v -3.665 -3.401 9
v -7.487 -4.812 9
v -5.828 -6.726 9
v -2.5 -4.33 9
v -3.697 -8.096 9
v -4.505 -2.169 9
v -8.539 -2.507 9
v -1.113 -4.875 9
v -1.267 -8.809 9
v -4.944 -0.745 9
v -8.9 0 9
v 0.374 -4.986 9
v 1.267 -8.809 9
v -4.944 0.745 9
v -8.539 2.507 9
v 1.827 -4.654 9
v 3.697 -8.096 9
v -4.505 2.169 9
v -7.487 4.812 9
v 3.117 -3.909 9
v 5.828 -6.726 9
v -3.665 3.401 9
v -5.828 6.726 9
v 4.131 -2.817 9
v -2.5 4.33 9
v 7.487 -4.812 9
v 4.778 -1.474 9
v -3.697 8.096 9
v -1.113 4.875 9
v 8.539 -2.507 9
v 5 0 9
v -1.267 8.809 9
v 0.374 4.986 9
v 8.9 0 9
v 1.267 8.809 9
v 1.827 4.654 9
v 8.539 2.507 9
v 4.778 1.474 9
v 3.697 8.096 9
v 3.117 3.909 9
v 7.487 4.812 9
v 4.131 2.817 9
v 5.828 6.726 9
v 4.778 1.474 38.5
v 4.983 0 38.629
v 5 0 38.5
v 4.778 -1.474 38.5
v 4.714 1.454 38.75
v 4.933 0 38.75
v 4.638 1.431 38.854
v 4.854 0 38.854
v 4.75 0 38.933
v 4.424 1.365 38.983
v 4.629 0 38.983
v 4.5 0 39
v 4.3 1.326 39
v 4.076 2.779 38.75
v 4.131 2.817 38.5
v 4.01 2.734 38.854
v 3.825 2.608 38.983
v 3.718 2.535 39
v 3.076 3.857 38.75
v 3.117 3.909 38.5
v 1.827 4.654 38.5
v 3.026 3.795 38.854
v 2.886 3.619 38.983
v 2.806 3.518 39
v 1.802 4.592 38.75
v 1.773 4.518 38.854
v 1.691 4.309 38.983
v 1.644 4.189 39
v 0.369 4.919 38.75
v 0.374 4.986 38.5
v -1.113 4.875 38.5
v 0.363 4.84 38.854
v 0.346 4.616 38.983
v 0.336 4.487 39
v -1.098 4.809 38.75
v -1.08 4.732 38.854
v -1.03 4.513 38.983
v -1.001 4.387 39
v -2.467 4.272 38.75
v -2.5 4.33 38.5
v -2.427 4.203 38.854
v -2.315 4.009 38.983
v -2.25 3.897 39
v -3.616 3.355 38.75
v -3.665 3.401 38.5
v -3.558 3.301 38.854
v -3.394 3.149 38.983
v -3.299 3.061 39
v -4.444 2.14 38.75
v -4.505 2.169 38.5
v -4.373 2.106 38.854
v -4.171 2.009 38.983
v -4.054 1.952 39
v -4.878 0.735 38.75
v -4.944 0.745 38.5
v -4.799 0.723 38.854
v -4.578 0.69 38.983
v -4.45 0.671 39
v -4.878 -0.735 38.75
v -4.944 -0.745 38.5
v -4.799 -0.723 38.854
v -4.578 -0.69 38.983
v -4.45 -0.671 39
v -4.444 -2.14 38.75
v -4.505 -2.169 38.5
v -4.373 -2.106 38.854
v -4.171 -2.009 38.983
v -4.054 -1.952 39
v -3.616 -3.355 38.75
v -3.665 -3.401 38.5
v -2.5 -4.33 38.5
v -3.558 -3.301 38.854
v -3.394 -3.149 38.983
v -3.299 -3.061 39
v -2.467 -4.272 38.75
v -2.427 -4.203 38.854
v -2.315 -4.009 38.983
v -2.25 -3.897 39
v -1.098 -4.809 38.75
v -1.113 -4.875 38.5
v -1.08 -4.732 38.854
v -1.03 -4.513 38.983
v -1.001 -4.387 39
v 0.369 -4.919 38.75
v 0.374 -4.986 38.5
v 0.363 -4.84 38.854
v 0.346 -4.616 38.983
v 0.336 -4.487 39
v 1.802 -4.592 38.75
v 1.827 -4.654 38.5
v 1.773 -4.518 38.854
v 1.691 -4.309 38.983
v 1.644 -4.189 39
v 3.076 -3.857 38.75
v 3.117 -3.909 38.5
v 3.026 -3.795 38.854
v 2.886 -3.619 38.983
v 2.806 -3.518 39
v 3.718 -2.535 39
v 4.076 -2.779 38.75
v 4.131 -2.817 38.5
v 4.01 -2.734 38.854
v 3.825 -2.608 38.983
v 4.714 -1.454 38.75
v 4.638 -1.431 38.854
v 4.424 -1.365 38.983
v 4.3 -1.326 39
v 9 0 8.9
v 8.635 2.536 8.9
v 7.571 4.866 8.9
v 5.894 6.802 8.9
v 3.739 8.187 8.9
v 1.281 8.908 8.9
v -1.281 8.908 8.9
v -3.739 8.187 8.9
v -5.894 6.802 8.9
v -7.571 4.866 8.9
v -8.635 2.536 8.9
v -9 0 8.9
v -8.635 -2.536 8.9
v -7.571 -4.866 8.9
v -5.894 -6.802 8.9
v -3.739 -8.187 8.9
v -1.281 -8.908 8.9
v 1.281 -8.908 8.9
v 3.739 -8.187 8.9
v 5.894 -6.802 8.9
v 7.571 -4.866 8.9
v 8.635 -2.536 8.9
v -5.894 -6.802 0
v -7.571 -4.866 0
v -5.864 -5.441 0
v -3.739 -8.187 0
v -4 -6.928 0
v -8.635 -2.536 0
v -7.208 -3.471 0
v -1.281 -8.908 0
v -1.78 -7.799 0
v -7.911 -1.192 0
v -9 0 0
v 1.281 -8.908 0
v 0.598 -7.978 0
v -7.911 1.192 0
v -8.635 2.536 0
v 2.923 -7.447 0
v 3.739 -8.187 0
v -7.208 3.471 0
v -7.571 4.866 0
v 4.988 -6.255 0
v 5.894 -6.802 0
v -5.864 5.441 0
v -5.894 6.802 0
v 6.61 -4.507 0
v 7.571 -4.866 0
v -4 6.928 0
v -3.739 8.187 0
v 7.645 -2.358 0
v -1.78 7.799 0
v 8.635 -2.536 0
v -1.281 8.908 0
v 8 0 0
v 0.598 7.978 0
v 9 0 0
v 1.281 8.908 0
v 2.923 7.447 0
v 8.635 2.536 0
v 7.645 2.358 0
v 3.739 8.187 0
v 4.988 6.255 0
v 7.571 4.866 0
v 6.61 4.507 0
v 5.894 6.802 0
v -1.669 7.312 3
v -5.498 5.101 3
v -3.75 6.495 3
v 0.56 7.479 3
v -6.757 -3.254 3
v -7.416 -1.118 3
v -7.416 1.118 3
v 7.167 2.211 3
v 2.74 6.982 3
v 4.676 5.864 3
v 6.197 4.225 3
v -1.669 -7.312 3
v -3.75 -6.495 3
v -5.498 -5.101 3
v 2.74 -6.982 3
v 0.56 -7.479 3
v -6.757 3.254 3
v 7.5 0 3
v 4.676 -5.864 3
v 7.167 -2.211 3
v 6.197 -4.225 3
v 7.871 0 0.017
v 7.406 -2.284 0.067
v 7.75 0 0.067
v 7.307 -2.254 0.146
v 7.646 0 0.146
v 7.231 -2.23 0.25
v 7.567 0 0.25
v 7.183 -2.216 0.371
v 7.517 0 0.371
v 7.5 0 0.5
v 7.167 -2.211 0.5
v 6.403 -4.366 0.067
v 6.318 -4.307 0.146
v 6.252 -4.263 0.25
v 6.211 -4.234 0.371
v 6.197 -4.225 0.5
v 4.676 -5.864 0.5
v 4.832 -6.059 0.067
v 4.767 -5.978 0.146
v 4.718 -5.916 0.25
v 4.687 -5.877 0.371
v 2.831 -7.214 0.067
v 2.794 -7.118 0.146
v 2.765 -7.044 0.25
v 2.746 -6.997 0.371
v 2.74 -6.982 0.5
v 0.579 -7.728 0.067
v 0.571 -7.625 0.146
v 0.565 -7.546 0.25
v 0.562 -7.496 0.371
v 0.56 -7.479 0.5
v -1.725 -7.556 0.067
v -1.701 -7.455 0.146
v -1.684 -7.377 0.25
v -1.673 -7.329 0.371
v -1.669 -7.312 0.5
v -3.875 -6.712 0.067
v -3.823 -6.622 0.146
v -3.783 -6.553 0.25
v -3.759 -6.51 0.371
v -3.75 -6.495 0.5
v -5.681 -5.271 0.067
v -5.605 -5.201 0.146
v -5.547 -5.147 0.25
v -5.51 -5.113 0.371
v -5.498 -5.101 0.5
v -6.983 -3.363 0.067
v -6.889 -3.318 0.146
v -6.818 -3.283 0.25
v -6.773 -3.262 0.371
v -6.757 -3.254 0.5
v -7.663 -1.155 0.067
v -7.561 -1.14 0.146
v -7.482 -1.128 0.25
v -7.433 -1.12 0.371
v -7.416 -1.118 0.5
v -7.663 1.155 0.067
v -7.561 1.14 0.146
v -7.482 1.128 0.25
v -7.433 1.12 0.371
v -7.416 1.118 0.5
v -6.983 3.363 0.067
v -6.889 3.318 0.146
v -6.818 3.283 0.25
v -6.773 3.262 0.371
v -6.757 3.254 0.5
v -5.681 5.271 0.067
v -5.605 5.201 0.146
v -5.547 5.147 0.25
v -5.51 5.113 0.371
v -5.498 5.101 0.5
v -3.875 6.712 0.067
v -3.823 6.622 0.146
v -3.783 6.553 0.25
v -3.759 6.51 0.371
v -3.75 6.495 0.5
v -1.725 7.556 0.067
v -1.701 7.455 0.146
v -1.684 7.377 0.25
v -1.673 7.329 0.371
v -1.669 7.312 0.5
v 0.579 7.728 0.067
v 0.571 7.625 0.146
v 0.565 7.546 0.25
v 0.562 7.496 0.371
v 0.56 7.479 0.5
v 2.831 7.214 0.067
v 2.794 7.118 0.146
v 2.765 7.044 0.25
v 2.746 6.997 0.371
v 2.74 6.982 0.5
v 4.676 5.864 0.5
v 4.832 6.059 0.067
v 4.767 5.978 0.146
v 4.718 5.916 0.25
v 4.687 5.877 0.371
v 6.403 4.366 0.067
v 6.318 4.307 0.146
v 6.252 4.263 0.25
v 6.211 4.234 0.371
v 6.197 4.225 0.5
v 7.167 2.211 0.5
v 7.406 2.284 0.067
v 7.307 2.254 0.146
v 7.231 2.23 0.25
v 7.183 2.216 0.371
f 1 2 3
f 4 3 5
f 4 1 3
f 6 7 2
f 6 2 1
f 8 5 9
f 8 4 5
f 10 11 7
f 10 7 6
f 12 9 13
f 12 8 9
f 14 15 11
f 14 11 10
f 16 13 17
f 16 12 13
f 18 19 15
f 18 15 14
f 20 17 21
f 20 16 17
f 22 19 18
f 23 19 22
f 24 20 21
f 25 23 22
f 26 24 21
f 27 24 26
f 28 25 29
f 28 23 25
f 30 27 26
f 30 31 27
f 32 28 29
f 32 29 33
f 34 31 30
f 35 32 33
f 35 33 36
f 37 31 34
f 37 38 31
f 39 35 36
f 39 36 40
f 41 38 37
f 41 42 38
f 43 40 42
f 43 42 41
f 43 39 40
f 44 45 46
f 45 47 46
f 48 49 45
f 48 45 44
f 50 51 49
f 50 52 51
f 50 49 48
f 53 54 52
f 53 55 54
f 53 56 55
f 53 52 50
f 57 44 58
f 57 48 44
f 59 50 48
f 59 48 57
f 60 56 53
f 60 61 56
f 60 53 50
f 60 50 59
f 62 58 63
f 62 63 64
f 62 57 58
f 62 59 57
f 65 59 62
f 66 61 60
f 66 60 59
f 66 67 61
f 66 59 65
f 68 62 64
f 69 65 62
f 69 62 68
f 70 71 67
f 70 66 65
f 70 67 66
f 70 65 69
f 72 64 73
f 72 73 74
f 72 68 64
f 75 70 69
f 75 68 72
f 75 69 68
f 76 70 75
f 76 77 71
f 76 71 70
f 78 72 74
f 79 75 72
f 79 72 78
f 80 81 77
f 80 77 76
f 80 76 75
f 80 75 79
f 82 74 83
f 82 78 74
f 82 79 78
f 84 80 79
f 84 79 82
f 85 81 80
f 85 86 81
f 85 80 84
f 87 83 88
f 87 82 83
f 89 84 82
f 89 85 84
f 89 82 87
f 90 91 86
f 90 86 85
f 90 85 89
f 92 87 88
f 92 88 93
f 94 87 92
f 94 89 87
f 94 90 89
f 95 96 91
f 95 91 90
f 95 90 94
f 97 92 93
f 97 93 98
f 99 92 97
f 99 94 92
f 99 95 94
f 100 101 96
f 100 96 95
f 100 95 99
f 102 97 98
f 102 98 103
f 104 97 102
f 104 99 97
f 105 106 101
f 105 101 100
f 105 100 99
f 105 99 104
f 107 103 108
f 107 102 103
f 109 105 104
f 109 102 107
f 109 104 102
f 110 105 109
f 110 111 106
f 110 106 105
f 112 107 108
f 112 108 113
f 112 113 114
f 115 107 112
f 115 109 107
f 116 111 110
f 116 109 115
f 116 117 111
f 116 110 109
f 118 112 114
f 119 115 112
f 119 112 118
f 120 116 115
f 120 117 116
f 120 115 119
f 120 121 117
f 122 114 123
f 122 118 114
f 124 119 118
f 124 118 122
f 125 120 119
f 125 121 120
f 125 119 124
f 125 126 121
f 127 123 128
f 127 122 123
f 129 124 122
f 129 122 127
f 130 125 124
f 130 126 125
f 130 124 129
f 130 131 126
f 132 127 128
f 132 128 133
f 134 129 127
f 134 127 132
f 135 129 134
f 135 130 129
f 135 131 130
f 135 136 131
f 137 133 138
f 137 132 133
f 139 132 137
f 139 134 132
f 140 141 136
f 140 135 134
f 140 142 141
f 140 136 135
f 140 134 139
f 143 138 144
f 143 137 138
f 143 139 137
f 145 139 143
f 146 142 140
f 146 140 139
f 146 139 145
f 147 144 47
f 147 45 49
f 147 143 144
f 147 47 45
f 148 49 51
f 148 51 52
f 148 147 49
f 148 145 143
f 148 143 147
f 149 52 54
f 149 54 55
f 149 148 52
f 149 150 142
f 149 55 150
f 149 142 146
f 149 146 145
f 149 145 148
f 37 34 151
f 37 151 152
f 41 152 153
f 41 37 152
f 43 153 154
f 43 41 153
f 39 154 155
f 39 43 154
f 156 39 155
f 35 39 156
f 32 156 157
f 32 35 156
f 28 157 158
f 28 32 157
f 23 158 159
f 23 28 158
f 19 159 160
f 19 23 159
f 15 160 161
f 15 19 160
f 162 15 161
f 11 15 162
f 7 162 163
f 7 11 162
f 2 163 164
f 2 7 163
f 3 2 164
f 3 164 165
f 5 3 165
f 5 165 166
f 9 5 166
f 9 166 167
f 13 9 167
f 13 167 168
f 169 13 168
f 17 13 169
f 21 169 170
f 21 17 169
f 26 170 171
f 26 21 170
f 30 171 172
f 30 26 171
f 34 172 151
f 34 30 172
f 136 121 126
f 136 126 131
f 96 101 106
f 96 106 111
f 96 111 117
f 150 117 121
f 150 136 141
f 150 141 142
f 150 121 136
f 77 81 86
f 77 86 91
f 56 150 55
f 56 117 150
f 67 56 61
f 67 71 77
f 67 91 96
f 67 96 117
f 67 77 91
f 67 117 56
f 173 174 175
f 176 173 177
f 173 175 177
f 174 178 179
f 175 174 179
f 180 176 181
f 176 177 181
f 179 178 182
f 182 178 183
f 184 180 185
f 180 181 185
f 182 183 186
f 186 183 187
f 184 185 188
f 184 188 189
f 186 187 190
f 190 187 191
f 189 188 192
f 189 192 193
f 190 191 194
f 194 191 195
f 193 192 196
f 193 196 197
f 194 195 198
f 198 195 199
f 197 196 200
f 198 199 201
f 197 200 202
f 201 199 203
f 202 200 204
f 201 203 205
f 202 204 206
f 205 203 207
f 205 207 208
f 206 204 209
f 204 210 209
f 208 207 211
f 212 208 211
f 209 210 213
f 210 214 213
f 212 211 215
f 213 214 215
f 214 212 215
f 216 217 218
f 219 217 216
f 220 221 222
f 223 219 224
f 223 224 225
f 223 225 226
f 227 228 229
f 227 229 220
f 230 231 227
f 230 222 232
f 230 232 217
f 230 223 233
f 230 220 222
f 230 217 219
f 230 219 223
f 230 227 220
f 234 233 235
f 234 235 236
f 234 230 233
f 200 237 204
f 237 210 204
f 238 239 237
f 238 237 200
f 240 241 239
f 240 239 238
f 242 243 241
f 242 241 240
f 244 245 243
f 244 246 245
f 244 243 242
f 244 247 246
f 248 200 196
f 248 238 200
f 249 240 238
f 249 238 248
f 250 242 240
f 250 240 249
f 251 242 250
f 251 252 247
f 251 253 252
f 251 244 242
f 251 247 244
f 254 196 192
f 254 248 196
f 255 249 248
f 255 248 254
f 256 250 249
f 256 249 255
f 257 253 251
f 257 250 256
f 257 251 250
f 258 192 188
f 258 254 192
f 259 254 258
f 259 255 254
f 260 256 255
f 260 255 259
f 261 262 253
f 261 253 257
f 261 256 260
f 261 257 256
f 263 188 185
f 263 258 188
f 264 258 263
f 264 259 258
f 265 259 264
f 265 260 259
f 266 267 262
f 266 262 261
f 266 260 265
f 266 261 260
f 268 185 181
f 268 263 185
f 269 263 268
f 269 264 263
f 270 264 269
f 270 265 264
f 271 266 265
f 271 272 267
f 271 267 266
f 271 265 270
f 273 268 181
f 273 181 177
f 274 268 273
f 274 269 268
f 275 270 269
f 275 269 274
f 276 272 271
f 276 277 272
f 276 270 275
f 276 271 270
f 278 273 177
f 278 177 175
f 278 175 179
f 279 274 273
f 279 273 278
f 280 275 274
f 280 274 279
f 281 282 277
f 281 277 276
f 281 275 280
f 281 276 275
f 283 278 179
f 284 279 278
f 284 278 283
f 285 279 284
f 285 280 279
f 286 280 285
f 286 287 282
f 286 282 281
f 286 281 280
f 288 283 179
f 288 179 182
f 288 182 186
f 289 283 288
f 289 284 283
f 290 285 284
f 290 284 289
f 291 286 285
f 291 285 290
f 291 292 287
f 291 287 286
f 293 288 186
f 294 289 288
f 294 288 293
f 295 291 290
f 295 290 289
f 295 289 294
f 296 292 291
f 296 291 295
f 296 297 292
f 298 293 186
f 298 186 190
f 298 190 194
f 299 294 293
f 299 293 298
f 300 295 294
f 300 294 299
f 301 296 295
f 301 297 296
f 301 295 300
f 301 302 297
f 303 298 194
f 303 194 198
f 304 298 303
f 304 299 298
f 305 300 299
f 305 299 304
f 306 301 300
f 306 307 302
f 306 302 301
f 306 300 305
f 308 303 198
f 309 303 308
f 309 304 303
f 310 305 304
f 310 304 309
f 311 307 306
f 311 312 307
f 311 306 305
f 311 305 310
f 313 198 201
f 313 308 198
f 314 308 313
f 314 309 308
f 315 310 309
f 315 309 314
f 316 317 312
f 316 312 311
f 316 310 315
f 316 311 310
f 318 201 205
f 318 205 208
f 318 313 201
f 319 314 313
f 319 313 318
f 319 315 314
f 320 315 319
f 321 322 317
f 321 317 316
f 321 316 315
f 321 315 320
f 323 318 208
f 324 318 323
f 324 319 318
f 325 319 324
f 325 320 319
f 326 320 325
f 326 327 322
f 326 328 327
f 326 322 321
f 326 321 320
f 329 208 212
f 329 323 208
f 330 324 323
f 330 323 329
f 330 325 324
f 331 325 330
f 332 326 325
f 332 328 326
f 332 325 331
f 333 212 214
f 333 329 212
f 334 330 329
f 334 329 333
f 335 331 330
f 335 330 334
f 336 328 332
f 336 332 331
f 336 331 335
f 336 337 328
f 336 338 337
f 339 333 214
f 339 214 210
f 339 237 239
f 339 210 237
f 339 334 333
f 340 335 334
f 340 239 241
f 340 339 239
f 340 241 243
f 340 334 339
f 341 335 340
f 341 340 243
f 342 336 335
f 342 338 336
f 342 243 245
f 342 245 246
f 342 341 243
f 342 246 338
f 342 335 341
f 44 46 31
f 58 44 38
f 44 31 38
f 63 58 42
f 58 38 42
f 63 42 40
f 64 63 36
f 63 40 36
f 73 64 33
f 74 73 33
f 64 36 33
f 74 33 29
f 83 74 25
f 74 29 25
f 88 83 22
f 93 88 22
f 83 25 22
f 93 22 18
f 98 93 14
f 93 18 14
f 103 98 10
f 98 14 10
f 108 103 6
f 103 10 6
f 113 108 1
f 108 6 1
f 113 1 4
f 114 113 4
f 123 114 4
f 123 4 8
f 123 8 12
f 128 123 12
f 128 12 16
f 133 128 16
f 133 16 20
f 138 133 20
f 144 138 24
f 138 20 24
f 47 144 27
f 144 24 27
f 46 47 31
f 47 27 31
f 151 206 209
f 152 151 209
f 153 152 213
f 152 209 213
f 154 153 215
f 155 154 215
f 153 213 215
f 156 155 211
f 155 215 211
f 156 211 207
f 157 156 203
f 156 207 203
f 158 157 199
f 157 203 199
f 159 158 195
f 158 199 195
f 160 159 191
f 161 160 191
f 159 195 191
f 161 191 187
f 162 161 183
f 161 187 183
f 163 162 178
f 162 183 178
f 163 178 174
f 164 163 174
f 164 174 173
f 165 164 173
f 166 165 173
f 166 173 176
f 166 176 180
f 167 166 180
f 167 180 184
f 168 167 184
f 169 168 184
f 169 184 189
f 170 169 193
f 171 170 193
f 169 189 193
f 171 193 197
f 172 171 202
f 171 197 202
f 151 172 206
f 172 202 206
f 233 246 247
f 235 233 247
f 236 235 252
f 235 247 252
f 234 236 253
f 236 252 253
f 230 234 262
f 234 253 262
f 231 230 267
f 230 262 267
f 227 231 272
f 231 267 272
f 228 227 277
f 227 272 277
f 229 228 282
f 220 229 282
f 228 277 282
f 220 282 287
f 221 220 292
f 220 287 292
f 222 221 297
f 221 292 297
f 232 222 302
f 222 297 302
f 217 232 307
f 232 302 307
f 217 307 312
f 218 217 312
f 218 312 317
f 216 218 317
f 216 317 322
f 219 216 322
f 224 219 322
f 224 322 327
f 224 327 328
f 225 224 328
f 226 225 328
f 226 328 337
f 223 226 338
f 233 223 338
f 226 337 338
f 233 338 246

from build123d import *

# Parameters (mm, degrees)
F0_R     = 9
F1_DEPTH = 9
F2_R     = 5
F3_DEPTH = 30
F4_R     = 7.5
F5_DEPTH = 3
F6_R     = 0.5
F7_SIZE  = 0.1


with BuildPart() as f1:
    # F0 (on Top) → F1 (new body)
    with BuildSketch(Plane.XY):
        Circle(F0_R)
    extrude(amount=F1_DEPTH)

    # F2 (on face) → F3 (join)
    with BuildSketch(Plane.XY.offset(9)):
        Circle(F2_R)
    extrude(amount=F3_DEPTH)

    # F4 (on face) → F5 (cut)
    with BuildSketch(Plane(origin=(0, 0, 0), x_dir=(1, 0, 0), z_dir=(0, 0, -1))):
        Circle(F4_R)
    extrude(amount=-F5_DEPTH, mode=Mode.SUBTRACT)

    # F6
    f6_edges = [f1.edges().sort_by_distance(p)[0] for p in [
        (-7.5, 0, 0),
        (-5, 0, 39),
    ]]
    fillet(f6_edges, radius=F6_R)

    # F7
    f7_edges = [f1.edges().sort_by_distance(p)[0] for p in [
        (-9, 0, 9),
    ]]
    chamfer(f7_edges, length=F7_SIZE)


solid = f1.part
